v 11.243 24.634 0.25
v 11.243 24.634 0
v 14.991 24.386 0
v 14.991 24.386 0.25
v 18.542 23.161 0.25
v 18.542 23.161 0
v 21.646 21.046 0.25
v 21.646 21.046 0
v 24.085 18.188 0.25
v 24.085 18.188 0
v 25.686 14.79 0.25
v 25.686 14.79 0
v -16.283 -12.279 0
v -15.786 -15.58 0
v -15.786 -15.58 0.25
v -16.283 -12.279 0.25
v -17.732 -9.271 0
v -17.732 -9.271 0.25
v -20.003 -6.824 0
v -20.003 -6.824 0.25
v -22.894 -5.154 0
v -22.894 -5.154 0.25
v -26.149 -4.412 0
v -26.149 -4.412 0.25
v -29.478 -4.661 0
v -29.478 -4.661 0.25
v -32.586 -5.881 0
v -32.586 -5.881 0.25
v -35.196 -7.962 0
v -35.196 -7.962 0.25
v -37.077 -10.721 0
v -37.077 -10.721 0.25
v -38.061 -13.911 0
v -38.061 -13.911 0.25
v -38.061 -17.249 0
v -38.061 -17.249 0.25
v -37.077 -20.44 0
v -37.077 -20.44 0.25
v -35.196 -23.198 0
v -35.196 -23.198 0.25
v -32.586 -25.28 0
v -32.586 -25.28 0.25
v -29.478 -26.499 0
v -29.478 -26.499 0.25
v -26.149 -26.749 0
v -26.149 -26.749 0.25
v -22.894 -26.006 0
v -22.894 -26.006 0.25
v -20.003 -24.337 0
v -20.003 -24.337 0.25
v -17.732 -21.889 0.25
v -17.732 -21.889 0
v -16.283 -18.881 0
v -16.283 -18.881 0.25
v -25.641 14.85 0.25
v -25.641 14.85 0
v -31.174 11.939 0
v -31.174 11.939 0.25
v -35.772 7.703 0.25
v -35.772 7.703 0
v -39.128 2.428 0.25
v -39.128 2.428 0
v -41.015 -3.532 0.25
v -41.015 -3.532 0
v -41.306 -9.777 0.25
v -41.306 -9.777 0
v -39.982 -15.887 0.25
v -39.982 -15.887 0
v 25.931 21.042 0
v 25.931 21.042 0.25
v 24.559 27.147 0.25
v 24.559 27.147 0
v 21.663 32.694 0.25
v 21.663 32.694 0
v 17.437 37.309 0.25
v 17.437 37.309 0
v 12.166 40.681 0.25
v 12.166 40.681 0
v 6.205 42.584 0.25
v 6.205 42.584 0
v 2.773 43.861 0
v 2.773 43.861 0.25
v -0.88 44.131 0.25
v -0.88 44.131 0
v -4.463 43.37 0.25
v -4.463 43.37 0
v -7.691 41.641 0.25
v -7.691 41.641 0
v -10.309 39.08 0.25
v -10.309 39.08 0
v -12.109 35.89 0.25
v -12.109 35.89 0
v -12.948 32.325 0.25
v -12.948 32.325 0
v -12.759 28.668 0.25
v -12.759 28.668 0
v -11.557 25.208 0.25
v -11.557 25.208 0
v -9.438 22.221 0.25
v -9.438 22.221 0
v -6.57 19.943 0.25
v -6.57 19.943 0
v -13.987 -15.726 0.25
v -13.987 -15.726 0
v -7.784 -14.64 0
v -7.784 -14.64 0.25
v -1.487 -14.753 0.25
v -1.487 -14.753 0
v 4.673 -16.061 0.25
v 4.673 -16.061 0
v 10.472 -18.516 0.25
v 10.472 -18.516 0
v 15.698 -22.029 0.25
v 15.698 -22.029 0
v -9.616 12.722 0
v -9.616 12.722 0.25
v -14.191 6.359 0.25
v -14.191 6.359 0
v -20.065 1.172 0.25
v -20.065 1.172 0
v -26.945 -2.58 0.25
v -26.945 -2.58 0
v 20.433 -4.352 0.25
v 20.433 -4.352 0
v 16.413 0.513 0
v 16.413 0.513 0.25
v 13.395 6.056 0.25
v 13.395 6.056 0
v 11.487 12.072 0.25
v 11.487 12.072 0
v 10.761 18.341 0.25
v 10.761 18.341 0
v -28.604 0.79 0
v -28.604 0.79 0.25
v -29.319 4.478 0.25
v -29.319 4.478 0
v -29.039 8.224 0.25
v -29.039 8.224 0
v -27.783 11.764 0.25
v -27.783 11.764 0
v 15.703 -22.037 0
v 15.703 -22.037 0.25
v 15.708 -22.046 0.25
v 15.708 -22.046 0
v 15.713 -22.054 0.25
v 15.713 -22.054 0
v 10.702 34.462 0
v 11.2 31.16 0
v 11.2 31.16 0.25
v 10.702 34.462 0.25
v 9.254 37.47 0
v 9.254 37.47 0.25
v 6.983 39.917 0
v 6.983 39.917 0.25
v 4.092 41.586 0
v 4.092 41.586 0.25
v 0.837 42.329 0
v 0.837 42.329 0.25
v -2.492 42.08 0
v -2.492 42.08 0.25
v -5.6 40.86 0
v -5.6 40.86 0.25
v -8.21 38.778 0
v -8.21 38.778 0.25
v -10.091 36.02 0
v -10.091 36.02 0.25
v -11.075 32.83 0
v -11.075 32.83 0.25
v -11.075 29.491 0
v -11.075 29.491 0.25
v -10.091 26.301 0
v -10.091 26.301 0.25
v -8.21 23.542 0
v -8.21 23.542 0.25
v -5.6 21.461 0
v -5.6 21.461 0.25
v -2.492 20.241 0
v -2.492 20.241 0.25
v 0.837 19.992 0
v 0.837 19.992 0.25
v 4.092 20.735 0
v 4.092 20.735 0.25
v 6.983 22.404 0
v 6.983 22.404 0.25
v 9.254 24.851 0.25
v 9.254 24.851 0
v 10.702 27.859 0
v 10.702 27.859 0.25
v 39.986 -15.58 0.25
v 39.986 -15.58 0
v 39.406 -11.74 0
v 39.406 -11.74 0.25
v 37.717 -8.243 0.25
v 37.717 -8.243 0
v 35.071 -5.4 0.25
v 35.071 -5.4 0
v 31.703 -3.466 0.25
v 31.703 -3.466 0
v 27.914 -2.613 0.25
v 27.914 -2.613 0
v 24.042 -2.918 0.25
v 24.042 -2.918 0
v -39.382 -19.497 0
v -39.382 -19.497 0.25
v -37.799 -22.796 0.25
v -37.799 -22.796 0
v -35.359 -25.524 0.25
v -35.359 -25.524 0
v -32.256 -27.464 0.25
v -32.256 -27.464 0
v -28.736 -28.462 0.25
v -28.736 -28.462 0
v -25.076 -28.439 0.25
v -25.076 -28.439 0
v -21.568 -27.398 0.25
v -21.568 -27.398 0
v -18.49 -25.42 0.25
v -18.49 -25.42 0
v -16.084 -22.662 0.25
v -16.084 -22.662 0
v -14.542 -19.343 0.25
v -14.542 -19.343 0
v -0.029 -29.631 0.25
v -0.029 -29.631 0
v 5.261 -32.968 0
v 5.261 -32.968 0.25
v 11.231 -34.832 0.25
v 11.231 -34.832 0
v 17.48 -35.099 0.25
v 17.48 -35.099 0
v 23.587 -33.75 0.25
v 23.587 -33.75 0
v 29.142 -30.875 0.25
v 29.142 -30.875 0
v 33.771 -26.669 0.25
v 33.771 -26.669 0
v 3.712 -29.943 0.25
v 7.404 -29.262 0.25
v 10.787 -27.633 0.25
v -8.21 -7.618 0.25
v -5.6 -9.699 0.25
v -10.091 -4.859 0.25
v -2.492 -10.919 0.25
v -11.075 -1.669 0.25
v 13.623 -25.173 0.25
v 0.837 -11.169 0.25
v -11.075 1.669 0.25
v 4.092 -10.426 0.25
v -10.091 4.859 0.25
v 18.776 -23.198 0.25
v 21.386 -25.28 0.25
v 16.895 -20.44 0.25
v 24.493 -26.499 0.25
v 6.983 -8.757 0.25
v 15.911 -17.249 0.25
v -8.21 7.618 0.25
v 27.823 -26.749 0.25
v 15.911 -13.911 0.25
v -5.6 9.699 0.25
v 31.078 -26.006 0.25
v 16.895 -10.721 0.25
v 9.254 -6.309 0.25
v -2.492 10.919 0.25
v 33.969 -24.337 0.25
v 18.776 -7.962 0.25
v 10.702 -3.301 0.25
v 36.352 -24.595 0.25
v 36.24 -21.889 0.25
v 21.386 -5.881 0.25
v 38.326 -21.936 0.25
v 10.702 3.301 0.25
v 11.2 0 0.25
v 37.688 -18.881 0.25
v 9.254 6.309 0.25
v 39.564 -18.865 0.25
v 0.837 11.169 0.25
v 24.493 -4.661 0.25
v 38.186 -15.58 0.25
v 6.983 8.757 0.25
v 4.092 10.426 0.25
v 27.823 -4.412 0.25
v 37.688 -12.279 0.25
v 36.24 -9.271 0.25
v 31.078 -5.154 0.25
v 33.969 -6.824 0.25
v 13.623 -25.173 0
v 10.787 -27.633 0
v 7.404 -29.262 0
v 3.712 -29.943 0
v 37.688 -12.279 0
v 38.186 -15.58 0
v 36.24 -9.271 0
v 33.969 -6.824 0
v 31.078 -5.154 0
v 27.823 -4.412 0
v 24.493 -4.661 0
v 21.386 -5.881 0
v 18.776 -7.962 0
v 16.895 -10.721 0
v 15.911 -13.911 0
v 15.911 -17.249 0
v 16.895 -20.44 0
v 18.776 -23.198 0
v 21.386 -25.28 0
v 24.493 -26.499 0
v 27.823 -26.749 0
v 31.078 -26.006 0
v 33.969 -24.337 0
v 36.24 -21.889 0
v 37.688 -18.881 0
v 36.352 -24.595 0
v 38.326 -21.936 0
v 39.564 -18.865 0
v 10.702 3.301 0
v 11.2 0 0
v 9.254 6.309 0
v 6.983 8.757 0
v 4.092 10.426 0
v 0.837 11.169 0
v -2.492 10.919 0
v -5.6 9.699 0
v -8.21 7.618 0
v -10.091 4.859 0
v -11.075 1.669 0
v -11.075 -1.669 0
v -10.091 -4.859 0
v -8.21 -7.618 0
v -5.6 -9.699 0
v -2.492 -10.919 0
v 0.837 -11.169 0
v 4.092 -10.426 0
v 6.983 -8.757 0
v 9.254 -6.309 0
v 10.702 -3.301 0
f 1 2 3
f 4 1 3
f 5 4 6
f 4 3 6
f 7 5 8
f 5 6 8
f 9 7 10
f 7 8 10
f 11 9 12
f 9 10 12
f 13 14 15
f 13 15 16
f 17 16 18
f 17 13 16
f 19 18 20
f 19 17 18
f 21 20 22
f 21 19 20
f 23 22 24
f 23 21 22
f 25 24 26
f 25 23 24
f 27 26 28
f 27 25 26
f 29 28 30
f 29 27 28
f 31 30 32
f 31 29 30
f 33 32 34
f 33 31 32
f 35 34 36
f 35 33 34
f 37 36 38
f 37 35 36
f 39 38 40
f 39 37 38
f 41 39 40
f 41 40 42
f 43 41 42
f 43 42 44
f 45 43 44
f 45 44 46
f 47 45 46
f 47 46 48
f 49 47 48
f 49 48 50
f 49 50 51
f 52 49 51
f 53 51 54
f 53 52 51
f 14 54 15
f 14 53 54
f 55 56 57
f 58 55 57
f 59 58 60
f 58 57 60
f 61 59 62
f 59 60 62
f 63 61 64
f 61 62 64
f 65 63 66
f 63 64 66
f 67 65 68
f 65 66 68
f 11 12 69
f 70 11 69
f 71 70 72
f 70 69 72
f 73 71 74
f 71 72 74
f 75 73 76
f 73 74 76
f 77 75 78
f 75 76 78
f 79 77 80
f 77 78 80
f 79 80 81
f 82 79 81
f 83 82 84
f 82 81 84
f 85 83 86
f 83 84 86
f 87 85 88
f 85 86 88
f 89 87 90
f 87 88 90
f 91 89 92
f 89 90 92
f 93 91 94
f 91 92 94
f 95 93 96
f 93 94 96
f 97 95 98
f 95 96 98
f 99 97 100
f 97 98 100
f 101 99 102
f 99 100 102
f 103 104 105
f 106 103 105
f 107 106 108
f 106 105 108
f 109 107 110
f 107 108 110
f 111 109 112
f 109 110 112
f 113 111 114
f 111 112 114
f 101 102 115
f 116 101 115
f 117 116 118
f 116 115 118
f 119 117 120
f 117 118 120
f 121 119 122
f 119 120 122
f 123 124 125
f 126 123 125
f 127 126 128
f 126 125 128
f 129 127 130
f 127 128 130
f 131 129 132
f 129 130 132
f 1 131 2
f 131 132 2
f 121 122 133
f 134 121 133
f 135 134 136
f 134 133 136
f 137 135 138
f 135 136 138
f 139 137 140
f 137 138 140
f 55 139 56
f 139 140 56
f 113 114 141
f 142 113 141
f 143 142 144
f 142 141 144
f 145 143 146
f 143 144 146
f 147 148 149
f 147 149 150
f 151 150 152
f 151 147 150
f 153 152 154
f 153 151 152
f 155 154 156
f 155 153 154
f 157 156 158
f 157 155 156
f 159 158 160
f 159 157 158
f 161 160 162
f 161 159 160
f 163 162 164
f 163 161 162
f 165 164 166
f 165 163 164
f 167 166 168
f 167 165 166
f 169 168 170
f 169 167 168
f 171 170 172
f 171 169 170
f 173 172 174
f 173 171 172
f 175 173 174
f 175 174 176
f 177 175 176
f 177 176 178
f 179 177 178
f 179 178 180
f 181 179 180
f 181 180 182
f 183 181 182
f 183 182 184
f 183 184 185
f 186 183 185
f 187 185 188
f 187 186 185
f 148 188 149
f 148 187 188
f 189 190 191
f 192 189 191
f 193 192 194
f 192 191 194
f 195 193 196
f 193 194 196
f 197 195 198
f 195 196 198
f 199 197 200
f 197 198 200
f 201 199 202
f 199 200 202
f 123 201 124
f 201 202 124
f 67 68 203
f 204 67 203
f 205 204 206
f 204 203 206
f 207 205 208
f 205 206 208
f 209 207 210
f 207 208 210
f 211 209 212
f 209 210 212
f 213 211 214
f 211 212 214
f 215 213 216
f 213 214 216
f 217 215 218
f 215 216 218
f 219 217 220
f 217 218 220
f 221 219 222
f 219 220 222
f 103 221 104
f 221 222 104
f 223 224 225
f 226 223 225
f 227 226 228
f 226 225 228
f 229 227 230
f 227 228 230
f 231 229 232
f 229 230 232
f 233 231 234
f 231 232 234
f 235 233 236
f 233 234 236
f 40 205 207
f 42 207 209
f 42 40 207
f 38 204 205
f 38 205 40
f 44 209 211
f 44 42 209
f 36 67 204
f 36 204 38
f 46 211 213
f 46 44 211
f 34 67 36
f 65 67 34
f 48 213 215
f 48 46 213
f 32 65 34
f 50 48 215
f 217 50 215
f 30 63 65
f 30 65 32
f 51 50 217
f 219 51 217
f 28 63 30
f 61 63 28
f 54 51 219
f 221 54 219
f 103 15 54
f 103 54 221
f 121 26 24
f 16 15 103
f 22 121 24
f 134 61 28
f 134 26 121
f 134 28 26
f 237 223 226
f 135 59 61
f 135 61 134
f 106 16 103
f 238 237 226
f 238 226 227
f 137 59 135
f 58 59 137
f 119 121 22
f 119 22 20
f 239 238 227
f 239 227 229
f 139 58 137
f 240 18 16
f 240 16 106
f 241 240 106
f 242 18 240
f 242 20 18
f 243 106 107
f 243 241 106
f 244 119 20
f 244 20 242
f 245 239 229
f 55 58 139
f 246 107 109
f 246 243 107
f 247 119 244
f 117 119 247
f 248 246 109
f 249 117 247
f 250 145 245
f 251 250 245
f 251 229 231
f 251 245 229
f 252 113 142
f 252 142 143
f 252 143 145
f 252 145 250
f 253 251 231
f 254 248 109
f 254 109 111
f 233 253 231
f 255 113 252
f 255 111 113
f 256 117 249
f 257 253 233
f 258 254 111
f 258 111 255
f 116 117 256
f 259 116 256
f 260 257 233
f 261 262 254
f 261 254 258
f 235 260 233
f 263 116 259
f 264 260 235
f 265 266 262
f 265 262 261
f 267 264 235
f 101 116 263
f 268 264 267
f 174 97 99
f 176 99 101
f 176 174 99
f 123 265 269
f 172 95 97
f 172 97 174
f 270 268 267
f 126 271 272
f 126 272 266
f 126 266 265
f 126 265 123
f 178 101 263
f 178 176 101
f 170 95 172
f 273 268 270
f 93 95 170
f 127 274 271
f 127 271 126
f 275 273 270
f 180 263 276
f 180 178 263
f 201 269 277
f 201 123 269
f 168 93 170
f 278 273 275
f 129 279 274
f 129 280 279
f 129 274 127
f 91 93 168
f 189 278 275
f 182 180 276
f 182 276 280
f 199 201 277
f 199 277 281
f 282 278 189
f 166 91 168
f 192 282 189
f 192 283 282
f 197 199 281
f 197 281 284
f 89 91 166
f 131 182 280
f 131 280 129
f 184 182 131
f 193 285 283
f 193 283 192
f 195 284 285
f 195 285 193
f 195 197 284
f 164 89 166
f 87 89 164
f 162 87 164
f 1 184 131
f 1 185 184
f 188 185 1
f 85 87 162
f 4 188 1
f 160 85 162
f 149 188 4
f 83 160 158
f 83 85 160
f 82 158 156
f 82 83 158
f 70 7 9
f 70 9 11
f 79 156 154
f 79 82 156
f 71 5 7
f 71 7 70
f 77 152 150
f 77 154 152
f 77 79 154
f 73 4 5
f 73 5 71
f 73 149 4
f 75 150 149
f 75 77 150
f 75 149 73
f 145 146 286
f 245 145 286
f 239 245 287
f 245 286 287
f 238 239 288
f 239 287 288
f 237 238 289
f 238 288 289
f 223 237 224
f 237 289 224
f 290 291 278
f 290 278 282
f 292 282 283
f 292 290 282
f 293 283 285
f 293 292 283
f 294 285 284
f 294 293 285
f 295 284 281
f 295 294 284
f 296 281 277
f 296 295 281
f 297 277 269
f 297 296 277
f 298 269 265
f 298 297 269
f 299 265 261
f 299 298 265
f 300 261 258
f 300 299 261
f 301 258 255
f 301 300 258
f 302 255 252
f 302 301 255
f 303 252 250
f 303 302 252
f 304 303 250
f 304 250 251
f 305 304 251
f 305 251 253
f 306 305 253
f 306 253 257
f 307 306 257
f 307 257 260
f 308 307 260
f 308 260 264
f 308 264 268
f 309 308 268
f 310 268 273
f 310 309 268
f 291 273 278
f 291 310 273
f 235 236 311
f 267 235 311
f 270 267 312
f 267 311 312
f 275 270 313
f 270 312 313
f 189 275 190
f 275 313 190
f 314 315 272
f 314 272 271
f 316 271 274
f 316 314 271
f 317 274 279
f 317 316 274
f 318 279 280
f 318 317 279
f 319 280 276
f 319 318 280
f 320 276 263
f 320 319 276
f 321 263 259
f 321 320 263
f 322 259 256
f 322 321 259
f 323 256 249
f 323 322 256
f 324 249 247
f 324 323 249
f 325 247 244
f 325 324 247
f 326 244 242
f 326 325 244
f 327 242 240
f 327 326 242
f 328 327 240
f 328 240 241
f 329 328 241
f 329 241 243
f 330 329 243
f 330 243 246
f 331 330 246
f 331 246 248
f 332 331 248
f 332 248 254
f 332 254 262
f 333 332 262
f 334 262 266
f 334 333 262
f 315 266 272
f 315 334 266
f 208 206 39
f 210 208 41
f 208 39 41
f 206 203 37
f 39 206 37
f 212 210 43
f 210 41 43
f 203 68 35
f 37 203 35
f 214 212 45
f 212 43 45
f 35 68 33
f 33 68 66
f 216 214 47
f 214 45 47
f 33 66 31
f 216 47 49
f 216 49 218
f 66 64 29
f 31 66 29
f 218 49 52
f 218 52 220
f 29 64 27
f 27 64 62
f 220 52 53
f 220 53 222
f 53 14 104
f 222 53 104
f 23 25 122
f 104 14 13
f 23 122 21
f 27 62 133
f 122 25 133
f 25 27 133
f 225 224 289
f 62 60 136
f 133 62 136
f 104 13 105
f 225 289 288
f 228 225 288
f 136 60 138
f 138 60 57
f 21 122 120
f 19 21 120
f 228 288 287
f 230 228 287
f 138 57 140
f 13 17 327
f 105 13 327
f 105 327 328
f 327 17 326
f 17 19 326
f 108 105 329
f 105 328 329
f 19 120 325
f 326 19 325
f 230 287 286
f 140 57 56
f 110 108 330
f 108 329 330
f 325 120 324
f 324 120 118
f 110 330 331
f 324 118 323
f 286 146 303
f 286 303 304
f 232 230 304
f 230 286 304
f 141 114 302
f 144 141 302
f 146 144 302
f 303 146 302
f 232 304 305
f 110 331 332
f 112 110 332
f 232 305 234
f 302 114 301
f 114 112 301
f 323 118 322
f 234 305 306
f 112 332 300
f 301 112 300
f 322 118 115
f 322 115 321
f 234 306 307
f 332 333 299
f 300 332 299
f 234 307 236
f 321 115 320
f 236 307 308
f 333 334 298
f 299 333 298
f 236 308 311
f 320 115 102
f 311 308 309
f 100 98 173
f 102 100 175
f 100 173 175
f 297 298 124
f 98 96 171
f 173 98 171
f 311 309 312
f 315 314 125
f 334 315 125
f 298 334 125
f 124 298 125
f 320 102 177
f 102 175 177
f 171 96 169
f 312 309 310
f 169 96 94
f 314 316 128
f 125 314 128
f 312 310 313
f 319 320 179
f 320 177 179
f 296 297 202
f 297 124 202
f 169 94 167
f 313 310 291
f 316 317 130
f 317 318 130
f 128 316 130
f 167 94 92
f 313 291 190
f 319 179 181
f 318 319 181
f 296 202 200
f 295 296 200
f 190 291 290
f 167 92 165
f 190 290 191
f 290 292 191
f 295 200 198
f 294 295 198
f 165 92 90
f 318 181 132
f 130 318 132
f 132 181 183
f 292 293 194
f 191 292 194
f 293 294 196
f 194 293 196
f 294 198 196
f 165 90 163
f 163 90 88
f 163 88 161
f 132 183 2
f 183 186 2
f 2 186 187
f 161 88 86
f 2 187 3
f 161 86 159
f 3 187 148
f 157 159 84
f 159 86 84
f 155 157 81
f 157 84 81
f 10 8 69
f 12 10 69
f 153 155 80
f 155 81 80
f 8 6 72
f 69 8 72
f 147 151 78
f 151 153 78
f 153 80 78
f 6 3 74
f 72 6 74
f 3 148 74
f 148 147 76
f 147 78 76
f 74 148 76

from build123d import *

# Parameters (mm, degrees)
F0_R     = 11.2
F1_DEPTH = 0.25


with BuildPart() as f1:
    # F0 (on Top) → F1 (new body)
    with BuildSketch(Plane.XY):
        with BuildLine():
            ThreePointArc((11.243032, 24.633988), (12.553076, 27.781021), (13, 31.160414))
            ThreePointArc((13, 31.160414), (11.172924, 37.806147), (6.205266, 42.58384))
            ThreePointArc((6.205266, 42.58384), (-11.321974, 37.548911), (-6.570071, 19.942831))
            ThreePointArc((-6.570071, 19.942831), (3.310722, 18.589053), (11.243032, 24.633988))
        make_face()
        with Locations((0, 31.160414)):
            Circle(F0_R, mode=Mode.SUBTRACT)
        with BuildLine():
            ThreePointArc((6.205266, 42.58384), (11.172924, 37.806147), (13, 31.160414))
            ThreePointArc((13, 31.160414), (12.553076, 27.781021), (11.243032, 24.633988))
            ThreePointArc((11.243032, 24.633988), (20.16491, 22.206844), (25.685808, 14.789929))
            ThreePointArc((25.685808, 14.789929), (21.662594, 32.693926), (6.205266, 42.58384))
        make_face()
        with BuildLine():
            ThreePointArc((20.433129, -4.352398), (12.296612, 9.017977), (11.243032, 24.633988))
            ThreePointArc((11.243032, 24.633988), (3.310722, 18.589053), (-6.570071, 19.942831))
            ThreePointArc((-6.570071, 19.942831), (-14.190564, 6.359224), (-26.944847, -2.580271))
            ThreePointArc((-26.944847, -2.580271), (-17.778886, -6.402277), (-13.98571, -15.580207))
            ThreePointArc((-13.98571, -15.580207), (-13.985915, -15.653237), (-13.98653, -15.726265))
            ThreePointArc((-13.98653, -15.726265), (1.62392, -15.259159), (15.697868, -22.028821))
            ThreePointArc((15.697868, -22.028821), (14.428475, -12.216303), (20.433129, -4.352398))
        make_face()
        Circle(F0_R, mode=Mode.SUBTRACT)
        with BuildLine():
            ThreePointArc((39.98571, -15.580207), (33.459366, -4.306708), (20.433129, -4.352398))
            ThreePointArc((20.433129, -4.352398), (14.428475, -12.216303), (15.697868, -22.028821))
            ThreePointArc((15.697868, -22.028821), (15.707601, -22.036816), (15.717332, -22.044815))
            ThreePointArc((15.717332, -22.044815), (15.714954, -22.049655), (15.712573, -22.054494))
            ThreePointArc((15.712573, -22.054494), (23.767322, -28.175523), (33.771118, -26.668861))
            ThreePointArc((33.771118, -26.668861), (38.326131, -21.935901), (39.98571, -15.580207))
        make_face()
        with Locations((26.98571, -15.580207)):
            Circle(F0_R, mode=Mode.SUBTRACT)
        with BuildLine():
            ThreePointArc((-13.98571, -15.580207), (-17.778886, -6.402277), (-26.944847, -2.580271))
            ThreePointArc((-26.944847, -2.580271), (-36.271667, -6.48235), (-39.982088, -15.88706))
            ThreePointArc((-39.982088, -15.88706), (-26.9053, -28.579958), (-13.98653, -15.726265))
            ThreePointArc((-13.98653, -15.726265), (-13.985915, -15.653237), (-13.98571, -15.580207))
        make_face()
        with Locations((-26.98571, -15.580207)):
            Circle(F0_R, mode=Mode.SUBTRACT)
        with BuildLine():
            ThreePointArc((-39.982088, -15.88706), (-36.271667, -6.48235), (-26.944847, -2.580271))
            ThreePointArc((-26.944847, -2.580271), (-29.303818, 6.359874), (-25.641029, 14.849569))
            ThreePointArc((-25.641029, 14.849569), (-39.12779, 2.428274), (-39.982088, -15.88706))
        make_face()
        with BuildLine():
            ThreePointArc((15.717332, -22.044815), (15.707601, -22.036816), (15.697868, -22.028821))
            ThreePointArc((15.697868, -22.028821), (15.705213, -22.041661), (15.712573, -22.054494))
            ThreePointArc((15.712573, -22.054494), (15.714954, -22.049655), (15.717332, -22.044815))
        make_face()
        with BuildLine():
            ThreePointArc((-0.029261, -29.630596), (17.47986, -35.099075), (33.771118, -26.668861))
            ThreePointArc((33.771118, -26.668861), (23.767322, -28.175523), (15.712573, -22.054494))
            ThreePointArc((15.712573, -22.054494), (9.149566, -28.560156), (-0.029261, -29.630596))
        make_face()
    extrude(amount=F1_DEPTH)


solid = f1.part
